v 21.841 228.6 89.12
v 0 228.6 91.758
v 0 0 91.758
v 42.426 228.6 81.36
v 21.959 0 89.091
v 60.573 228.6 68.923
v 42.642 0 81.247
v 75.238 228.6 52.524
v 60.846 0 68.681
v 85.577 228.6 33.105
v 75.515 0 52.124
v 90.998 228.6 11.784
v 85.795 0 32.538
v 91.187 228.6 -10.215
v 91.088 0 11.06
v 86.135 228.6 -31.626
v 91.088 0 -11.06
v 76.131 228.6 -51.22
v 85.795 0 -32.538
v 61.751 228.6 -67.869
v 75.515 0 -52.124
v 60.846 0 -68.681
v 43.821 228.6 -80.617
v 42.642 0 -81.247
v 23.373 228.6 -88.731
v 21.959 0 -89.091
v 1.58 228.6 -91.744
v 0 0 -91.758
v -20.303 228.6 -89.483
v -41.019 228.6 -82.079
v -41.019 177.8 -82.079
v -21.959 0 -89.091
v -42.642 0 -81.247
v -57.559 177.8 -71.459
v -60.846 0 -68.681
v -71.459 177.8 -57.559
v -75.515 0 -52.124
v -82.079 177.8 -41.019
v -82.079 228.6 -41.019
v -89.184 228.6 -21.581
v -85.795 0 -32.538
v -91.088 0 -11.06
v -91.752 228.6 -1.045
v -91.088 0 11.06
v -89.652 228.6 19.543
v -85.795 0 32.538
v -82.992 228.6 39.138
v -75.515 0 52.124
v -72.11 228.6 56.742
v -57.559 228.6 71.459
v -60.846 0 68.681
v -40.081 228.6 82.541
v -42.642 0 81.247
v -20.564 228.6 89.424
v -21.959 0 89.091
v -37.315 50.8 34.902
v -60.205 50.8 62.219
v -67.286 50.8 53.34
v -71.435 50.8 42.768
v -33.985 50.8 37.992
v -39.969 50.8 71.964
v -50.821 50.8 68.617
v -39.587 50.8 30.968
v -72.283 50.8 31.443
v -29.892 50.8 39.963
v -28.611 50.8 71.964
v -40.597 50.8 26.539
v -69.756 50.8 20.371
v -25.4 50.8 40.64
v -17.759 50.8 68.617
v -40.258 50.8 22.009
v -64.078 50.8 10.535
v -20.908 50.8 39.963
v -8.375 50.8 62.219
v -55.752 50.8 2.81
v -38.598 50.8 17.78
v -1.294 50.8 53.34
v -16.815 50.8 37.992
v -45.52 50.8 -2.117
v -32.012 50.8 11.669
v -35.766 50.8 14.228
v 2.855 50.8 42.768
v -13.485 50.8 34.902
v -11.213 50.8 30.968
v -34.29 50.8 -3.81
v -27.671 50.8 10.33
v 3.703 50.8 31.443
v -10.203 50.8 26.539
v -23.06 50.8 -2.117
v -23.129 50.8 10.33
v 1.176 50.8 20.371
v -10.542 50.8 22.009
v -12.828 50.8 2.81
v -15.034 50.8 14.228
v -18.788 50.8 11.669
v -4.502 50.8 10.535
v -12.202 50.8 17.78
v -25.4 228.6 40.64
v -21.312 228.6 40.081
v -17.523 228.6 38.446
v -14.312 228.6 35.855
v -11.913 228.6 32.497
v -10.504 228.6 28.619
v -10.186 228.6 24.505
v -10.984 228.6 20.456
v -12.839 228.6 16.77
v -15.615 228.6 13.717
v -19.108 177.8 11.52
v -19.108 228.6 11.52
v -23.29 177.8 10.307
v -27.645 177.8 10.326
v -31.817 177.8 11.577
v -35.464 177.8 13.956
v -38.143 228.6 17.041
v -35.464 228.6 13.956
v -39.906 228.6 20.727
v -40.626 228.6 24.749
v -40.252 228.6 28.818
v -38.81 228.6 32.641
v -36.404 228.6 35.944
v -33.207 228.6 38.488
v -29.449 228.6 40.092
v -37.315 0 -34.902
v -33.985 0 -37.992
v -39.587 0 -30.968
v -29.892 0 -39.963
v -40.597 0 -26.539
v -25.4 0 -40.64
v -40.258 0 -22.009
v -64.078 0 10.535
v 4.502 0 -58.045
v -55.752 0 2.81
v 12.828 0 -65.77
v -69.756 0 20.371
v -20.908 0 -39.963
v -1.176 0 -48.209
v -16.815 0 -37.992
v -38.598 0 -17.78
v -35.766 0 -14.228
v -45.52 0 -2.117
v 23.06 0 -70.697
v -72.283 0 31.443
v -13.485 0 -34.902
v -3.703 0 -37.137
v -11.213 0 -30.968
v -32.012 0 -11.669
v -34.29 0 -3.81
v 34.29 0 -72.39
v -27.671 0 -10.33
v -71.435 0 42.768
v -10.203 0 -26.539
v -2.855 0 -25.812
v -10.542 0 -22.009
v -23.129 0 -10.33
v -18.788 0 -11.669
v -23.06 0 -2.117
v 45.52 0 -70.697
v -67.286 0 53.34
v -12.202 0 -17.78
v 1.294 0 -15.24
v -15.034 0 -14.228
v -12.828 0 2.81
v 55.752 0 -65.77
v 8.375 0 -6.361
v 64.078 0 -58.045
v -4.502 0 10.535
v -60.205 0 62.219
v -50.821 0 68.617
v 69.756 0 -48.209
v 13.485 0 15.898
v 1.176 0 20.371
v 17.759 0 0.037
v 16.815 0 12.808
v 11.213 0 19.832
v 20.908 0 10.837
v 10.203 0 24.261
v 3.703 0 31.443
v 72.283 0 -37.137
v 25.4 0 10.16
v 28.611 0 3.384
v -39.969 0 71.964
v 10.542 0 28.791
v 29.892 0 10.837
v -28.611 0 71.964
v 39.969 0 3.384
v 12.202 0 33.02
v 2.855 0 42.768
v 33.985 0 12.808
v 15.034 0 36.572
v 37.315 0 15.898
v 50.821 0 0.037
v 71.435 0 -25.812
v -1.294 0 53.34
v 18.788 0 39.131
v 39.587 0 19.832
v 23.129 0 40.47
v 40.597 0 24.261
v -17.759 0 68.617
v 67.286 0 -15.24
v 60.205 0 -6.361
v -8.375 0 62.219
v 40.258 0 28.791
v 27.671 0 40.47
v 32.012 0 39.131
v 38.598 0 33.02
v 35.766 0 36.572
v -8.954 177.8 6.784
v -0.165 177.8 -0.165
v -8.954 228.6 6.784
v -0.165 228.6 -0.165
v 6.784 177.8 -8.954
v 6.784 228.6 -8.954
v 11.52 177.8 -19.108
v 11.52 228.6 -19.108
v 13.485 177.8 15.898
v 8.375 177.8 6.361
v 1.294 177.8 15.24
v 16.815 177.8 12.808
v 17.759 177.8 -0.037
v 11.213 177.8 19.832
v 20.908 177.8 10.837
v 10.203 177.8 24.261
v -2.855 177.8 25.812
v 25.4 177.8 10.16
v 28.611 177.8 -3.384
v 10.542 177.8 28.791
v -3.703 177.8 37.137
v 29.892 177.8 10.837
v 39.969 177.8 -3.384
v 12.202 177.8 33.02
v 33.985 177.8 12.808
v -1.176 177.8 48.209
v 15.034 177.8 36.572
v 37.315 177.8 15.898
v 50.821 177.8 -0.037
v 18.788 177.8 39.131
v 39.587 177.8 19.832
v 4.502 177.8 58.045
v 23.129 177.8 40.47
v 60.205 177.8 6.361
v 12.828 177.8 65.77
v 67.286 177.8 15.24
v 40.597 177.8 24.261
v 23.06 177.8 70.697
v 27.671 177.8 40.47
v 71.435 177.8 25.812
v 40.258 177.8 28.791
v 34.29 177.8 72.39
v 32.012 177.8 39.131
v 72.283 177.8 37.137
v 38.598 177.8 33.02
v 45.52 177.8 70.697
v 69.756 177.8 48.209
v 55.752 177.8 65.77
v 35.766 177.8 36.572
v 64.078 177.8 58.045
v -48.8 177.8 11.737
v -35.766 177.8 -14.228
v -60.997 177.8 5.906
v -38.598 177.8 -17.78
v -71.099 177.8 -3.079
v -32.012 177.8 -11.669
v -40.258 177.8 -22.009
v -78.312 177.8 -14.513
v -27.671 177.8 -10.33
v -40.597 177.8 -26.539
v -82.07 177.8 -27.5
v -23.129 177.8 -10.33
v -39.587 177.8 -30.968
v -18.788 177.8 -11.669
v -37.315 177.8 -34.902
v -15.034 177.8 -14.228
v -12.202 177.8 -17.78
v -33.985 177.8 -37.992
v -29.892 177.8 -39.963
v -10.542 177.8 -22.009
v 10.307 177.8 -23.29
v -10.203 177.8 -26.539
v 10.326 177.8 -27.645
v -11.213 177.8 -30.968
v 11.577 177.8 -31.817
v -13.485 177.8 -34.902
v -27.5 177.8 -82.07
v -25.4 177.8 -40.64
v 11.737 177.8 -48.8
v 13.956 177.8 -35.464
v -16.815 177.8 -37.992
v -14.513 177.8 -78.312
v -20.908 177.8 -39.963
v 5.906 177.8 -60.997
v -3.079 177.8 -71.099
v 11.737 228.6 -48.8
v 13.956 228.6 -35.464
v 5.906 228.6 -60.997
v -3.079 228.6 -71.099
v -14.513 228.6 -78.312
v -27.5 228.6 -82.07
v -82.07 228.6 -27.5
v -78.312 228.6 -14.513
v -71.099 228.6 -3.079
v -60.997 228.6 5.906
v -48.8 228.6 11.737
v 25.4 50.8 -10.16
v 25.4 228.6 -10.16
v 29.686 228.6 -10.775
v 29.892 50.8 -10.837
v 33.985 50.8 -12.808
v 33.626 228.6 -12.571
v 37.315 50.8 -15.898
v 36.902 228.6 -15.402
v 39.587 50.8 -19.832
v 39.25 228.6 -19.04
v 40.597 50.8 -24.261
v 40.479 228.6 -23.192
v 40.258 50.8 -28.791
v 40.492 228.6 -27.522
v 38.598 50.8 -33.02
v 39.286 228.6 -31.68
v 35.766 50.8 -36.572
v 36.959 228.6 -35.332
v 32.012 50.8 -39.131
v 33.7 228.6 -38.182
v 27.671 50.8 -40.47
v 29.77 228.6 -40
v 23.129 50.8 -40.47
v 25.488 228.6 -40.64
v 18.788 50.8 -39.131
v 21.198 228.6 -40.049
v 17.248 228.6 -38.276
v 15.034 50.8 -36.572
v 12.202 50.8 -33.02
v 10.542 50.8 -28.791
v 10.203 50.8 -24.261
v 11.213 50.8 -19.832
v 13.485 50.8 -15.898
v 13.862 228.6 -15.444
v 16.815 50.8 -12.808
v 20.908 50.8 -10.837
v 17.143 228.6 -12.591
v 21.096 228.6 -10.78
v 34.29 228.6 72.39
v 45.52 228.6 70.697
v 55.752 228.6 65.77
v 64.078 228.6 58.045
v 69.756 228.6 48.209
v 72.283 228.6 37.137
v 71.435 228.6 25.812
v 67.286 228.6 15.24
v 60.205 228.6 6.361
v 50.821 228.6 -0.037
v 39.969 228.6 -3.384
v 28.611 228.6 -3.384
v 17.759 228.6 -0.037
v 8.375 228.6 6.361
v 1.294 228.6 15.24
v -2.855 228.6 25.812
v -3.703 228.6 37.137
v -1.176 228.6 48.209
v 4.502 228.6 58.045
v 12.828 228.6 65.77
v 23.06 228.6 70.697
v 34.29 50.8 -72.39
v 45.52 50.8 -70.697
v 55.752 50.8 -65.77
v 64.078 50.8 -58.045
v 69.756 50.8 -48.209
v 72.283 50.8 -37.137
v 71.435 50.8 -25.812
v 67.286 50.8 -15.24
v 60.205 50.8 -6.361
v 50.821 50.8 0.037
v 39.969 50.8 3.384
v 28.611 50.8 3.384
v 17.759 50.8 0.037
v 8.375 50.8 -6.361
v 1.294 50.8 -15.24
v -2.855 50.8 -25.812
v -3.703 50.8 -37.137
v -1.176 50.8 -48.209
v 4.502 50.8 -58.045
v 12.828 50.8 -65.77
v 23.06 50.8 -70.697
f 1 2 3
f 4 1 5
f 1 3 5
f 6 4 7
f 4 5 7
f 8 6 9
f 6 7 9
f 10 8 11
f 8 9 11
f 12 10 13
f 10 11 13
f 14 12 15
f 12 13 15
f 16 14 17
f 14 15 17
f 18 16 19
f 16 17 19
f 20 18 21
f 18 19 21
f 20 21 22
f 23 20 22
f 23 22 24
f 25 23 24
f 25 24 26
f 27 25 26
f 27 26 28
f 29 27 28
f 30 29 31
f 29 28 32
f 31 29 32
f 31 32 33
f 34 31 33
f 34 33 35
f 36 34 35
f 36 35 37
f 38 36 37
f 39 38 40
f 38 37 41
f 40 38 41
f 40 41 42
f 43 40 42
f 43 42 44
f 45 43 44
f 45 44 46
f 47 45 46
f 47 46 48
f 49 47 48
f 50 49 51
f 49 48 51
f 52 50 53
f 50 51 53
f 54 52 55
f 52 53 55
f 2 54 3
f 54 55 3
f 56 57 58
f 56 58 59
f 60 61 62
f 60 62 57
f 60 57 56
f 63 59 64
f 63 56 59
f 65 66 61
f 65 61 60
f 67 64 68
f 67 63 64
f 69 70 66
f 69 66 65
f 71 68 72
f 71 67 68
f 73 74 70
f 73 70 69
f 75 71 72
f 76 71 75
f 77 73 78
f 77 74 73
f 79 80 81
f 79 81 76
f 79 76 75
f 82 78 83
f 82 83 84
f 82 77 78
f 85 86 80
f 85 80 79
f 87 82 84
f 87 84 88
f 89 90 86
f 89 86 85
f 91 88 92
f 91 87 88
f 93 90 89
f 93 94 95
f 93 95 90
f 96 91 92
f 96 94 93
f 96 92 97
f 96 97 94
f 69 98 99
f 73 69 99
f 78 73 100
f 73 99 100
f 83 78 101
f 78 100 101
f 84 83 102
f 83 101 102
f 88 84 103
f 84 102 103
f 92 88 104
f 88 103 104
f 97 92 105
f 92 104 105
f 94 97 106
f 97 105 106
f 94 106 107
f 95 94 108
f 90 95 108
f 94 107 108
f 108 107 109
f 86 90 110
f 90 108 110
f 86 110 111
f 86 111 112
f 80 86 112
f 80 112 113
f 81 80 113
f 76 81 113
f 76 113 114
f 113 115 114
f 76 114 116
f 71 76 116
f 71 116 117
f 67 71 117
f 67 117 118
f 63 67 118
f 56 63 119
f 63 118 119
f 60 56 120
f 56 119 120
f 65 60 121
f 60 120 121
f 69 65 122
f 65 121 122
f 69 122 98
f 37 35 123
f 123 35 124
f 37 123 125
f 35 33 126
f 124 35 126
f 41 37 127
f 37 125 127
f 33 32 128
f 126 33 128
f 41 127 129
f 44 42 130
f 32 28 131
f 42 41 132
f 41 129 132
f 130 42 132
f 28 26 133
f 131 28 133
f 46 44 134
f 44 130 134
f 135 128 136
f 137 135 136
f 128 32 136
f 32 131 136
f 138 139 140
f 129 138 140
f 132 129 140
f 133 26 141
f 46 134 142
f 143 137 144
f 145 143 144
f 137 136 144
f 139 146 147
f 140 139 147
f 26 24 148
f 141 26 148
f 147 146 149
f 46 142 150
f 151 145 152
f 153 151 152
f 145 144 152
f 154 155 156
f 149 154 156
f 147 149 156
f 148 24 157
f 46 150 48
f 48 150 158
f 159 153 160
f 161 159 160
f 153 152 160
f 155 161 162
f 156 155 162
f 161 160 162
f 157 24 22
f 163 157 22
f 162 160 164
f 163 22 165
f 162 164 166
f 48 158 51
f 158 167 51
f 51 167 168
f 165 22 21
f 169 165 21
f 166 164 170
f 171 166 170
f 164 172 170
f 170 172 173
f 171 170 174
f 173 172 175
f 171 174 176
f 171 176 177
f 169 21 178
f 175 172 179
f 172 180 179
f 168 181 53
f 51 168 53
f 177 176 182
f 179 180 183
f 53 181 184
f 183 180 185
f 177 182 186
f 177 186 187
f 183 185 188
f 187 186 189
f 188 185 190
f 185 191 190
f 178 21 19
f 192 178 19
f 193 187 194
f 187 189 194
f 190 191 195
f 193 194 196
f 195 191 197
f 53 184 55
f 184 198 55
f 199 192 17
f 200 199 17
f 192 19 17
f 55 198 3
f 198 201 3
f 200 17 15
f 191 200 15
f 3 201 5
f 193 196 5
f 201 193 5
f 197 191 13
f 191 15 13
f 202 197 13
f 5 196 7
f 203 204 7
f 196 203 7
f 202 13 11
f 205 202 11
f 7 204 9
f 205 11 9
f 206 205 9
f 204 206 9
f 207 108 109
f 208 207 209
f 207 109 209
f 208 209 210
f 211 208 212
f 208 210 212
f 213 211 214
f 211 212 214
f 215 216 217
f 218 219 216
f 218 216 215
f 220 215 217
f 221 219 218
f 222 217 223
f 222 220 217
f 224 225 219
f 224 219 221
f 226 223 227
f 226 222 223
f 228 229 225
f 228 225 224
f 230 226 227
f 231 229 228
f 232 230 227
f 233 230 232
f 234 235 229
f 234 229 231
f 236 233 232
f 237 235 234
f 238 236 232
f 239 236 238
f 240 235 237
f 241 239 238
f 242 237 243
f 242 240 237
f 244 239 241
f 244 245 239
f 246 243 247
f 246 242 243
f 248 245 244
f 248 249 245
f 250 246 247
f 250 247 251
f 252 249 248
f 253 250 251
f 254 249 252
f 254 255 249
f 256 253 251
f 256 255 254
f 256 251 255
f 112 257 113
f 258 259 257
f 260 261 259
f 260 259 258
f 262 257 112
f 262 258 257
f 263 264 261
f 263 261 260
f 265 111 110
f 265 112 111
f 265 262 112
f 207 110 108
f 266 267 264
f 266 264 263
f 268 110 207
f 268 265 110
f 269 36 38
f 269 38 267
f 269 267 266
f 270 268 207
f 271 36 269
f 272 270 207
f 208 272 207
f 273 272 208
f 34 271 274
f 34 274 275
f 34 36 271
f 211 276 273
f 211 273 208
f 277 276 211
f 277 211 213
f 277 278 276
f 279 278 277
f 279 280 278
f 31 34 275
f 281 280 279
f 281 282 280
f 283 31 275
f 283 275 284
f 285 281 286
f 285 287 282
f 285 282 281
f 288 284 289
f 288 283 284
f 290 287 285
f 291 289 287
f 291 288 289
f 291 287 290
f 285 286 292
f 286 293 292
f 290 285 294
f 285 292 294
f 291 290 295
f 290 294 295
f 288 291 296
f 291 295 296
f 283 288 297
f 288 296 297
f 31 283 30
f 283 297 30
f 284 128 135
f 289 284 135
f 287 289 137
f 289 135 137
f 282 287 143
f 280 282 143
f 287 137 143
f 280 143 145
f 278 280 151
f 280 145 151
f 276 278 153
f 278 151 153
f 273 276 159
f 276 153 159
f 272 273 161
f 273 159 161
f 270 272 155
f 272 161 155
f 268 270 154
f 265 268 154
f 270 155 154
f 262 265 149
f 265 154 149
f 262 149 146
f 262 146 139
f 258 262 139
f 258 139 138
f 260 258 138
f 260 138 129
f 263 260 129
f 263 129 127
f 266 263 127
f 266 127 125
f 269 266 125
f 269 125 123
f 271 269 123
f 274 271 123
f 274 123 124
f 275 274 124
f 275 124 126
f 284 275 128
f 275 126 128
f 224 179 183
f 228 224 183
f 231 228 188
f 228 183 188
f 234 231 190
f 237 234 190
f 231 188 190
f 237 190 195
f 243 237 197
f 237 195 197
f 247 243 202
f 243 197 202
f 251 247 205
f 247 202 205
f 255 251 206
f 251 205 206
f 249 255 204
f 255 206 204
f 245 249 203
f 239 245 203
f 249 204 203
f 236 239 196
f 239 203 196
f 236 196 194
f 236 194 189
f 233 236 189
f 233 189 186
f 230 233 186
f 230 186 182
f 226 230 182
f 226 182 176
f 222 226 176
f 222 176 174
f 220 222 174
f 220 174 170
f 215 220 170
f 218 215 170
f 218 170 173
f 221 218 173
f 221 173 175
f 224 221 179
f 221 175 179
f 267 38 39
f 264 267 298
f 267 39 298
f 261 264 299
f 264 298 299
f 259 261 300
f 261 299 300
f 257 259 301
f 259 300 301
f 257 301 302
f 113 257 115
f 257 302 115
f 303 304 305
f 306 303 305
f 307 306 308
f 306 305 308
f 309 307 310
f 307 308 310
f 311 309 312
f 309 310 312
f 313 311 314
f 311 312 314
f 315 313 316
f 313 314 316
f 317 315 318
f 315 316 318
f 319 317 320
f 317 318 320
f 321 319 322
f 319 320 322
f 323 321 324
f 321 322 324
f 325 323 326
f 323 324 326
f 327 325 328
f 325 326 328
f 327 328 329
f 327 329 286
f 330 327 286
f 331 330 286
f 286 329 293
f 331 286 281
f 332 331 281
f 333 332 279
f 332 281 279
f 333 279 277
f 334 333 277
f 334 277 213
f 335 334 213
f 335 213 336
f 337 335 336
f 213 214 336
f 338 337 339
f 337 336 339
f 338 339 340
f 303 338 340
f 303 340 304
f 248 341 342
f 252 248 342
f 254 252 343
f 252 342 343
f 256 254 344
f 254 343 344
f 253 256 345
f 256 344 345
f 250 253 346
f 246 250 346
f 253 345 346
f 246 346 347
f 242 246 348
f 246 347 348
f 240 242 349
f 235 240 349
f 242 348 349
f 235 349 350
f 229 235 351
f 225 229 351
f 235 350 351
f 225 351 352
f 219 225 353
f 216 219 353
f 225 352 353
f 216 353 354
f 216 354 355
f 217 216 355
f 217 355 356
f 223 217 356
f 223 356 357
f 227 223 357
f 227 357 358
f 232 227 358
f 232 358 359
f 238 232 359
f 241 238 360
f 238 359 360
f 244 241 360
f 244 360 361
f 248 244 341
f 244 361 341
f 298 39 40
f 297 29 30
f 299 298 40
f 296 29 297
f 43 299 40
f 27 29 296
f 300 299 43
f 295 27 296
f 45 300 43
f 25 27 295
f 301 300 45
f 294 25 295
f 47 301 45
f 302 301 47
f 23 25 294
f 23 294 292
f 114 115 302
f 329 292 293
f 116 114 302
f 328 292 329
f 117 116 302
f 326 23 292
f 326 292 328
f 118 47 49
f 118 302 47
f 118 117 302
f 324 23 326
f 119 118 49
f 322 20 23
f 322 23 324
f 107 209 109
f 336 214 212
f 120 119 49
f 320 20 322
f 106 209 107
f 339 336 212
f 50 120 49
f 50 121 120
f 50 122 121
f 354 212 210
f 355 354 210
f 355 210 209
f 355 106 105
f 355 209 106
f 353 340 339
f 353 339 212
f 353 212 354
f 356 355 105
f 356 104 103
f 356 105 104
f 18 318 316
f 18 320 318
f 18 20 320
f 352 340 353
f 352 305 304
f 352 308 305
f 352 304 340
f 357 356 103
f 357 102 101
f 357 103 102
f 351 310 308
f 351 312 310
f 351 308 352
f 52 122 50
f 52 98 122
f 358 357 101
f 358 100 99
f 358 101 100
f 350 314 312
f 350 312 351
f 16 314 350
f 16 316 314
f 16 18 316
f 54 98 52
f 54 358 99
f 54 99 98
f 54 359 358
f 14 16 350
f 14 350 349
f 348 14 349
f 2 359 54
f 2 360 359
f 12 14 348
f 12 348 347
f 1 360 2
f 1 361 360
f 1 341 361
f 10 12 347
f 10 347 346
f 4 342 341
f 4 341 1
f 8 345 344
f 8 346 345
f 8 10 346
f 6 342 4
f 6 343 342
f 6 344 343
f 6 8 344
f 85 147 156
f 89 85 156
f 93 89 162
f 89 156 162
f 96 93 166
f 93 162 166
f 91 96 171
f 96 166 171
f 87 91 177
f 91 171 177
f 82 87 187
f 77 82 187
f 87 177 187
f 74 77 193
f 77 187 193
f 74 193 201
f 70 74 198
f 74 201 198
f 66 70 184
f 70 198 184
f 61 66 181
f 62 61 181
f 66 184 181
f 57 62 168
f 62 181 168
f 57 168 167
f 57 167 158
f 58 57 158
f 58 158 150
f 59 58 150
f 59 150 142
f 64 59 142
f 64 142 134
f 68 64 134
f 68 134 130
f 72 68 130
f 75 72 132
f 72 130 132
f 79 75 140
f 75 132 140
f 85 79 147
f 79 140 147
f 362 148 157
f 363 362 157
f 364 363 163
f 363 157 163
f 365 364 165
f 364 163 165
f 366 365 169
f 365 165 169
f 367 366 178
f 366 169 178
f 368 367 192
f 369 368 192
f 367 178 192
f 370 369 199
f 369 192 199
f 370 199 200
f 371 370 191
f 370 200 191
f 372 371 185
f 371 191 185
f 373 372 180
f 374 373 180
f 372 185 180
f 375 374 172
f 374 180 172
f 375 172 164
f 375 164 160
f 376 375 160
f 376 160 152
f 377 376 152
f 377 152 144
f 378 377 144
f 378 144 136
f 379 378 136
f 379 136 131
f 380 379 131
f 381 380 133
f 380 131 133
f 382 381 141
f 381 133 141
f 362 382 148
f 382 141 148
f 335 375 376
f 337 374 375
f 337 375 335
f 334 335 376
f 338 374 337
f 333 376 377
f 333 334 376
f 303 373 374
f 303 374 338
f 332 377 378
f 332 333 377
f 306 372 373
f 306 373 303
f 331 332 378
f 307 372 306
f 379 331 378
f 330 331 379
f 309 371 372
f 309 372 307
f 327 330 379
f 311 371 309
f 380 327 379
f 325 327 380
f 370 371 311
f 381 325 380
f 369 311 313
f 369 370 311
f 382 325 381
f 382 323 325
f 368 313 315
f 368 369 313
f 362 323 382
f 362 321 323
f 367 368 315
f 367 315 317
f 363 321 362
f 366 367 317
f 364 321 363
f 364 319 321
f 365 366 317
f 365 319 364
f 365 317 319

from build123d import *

# Parameters (mm, degrees)
SKETCH1_R           = 91.7575
BOSS_EXTRUDE1_DEPTH = 228.6
SKETCH2_R           = 48.26
SKETCH2_R_2         = 38.1
CUT_EXTRUDE1_DEPTH  = 50.8
SKETCH4_R           = 15.24
CUT_EXTRUDE2_DEPTH  = 177.8
SKETCH5_R           = 15.24
CUT_EXTRUDE3_DEPTH  = 177.8
SKETCH6_R           = 38.1
CUT_EXTRUDE9_DEPTH  = 50.8


with BuildPart() as part:
    # Sketch1 → Boss-Extrude1 (new body)
    with BuildSketch(Plane(origin=(0, 0, 0), x_dir=(1, 0, 0), z_dir=(0, 1, 0))):
        with Locations(Location((0, 0, 0), (0, 0, 270))):
            Circle(SKETCH1_R)
    extrude(amount=BOSS_EXTRUDE1_DEPTH)

    # Sketch2 → Cut-Extrude1 (cut)
    with BuildSketch(Plane(origin=(0, 228.6, 0), x_dir=(1, 0, 0), z_dir=(0, 1, 0))):
        with Locations((-34.29, 34.29)):
            Circle(SKETCH2_R)
        with Locations(Location((34.29, -34.29, 0), (0, 0, 270))):
            Circle(SKETCH2_R_2)
    extrude(amount=-CUT_EXTRUDE1_DEPTH, mode=Mode.SUBTRACT)

    # Sketch4 → Cut-Extrude2 (cut)
    with BuildSketch(Plane(origin=(0, 228.6, 0), x_dir=(1, 0, 0), z_dir=(0, 1, 0))):
        with Locations(Location((25.4, 25.4, 0), (0, 0, 270))):
            Circle(SKETCH4_R)
        with Locations(Location((-25.4, -25.4, 0), (0, 0, 270))):
            Circle(SKETCH4_R)
    extrude(amount=-CUT_EXTRUDE2_DEPTH, mode=Mode.SUBTRACT)

    # Sketch5 → Cut-Extrude3 (cut)
    with BuildSketch(Plane.XZ):
        with Locations(Location((-25.4, -25.4, 0), (0, 0, 270))):
            Circle(SKETCH5_R)
        with Locations(Location((25.4, 25.4, 0), (0, 0, 270))):
            Circle(SKETCH5_R)
    extrude(amount=-CUT_EXTRUDE3_DEPTH, mode=Mode.SUBTRACT)

    # Sketch6 → Cut-Extrude9 (cut)
    with BuildSketch(Plane.XZ):
        with Locations(Location((-34.29, 34.29, 0), (0, 0, 270))):
            Circle(SKETCH6_R)
        with Locations(Location((34.29, -34.29, 0), (0, 0, 270))):
            Circle(SKETCH6_R)
    extrude(amount=-CUT_EXTRUDE9_DEPTH, mode=Mode.SUBTRACT)


solid = part.part
